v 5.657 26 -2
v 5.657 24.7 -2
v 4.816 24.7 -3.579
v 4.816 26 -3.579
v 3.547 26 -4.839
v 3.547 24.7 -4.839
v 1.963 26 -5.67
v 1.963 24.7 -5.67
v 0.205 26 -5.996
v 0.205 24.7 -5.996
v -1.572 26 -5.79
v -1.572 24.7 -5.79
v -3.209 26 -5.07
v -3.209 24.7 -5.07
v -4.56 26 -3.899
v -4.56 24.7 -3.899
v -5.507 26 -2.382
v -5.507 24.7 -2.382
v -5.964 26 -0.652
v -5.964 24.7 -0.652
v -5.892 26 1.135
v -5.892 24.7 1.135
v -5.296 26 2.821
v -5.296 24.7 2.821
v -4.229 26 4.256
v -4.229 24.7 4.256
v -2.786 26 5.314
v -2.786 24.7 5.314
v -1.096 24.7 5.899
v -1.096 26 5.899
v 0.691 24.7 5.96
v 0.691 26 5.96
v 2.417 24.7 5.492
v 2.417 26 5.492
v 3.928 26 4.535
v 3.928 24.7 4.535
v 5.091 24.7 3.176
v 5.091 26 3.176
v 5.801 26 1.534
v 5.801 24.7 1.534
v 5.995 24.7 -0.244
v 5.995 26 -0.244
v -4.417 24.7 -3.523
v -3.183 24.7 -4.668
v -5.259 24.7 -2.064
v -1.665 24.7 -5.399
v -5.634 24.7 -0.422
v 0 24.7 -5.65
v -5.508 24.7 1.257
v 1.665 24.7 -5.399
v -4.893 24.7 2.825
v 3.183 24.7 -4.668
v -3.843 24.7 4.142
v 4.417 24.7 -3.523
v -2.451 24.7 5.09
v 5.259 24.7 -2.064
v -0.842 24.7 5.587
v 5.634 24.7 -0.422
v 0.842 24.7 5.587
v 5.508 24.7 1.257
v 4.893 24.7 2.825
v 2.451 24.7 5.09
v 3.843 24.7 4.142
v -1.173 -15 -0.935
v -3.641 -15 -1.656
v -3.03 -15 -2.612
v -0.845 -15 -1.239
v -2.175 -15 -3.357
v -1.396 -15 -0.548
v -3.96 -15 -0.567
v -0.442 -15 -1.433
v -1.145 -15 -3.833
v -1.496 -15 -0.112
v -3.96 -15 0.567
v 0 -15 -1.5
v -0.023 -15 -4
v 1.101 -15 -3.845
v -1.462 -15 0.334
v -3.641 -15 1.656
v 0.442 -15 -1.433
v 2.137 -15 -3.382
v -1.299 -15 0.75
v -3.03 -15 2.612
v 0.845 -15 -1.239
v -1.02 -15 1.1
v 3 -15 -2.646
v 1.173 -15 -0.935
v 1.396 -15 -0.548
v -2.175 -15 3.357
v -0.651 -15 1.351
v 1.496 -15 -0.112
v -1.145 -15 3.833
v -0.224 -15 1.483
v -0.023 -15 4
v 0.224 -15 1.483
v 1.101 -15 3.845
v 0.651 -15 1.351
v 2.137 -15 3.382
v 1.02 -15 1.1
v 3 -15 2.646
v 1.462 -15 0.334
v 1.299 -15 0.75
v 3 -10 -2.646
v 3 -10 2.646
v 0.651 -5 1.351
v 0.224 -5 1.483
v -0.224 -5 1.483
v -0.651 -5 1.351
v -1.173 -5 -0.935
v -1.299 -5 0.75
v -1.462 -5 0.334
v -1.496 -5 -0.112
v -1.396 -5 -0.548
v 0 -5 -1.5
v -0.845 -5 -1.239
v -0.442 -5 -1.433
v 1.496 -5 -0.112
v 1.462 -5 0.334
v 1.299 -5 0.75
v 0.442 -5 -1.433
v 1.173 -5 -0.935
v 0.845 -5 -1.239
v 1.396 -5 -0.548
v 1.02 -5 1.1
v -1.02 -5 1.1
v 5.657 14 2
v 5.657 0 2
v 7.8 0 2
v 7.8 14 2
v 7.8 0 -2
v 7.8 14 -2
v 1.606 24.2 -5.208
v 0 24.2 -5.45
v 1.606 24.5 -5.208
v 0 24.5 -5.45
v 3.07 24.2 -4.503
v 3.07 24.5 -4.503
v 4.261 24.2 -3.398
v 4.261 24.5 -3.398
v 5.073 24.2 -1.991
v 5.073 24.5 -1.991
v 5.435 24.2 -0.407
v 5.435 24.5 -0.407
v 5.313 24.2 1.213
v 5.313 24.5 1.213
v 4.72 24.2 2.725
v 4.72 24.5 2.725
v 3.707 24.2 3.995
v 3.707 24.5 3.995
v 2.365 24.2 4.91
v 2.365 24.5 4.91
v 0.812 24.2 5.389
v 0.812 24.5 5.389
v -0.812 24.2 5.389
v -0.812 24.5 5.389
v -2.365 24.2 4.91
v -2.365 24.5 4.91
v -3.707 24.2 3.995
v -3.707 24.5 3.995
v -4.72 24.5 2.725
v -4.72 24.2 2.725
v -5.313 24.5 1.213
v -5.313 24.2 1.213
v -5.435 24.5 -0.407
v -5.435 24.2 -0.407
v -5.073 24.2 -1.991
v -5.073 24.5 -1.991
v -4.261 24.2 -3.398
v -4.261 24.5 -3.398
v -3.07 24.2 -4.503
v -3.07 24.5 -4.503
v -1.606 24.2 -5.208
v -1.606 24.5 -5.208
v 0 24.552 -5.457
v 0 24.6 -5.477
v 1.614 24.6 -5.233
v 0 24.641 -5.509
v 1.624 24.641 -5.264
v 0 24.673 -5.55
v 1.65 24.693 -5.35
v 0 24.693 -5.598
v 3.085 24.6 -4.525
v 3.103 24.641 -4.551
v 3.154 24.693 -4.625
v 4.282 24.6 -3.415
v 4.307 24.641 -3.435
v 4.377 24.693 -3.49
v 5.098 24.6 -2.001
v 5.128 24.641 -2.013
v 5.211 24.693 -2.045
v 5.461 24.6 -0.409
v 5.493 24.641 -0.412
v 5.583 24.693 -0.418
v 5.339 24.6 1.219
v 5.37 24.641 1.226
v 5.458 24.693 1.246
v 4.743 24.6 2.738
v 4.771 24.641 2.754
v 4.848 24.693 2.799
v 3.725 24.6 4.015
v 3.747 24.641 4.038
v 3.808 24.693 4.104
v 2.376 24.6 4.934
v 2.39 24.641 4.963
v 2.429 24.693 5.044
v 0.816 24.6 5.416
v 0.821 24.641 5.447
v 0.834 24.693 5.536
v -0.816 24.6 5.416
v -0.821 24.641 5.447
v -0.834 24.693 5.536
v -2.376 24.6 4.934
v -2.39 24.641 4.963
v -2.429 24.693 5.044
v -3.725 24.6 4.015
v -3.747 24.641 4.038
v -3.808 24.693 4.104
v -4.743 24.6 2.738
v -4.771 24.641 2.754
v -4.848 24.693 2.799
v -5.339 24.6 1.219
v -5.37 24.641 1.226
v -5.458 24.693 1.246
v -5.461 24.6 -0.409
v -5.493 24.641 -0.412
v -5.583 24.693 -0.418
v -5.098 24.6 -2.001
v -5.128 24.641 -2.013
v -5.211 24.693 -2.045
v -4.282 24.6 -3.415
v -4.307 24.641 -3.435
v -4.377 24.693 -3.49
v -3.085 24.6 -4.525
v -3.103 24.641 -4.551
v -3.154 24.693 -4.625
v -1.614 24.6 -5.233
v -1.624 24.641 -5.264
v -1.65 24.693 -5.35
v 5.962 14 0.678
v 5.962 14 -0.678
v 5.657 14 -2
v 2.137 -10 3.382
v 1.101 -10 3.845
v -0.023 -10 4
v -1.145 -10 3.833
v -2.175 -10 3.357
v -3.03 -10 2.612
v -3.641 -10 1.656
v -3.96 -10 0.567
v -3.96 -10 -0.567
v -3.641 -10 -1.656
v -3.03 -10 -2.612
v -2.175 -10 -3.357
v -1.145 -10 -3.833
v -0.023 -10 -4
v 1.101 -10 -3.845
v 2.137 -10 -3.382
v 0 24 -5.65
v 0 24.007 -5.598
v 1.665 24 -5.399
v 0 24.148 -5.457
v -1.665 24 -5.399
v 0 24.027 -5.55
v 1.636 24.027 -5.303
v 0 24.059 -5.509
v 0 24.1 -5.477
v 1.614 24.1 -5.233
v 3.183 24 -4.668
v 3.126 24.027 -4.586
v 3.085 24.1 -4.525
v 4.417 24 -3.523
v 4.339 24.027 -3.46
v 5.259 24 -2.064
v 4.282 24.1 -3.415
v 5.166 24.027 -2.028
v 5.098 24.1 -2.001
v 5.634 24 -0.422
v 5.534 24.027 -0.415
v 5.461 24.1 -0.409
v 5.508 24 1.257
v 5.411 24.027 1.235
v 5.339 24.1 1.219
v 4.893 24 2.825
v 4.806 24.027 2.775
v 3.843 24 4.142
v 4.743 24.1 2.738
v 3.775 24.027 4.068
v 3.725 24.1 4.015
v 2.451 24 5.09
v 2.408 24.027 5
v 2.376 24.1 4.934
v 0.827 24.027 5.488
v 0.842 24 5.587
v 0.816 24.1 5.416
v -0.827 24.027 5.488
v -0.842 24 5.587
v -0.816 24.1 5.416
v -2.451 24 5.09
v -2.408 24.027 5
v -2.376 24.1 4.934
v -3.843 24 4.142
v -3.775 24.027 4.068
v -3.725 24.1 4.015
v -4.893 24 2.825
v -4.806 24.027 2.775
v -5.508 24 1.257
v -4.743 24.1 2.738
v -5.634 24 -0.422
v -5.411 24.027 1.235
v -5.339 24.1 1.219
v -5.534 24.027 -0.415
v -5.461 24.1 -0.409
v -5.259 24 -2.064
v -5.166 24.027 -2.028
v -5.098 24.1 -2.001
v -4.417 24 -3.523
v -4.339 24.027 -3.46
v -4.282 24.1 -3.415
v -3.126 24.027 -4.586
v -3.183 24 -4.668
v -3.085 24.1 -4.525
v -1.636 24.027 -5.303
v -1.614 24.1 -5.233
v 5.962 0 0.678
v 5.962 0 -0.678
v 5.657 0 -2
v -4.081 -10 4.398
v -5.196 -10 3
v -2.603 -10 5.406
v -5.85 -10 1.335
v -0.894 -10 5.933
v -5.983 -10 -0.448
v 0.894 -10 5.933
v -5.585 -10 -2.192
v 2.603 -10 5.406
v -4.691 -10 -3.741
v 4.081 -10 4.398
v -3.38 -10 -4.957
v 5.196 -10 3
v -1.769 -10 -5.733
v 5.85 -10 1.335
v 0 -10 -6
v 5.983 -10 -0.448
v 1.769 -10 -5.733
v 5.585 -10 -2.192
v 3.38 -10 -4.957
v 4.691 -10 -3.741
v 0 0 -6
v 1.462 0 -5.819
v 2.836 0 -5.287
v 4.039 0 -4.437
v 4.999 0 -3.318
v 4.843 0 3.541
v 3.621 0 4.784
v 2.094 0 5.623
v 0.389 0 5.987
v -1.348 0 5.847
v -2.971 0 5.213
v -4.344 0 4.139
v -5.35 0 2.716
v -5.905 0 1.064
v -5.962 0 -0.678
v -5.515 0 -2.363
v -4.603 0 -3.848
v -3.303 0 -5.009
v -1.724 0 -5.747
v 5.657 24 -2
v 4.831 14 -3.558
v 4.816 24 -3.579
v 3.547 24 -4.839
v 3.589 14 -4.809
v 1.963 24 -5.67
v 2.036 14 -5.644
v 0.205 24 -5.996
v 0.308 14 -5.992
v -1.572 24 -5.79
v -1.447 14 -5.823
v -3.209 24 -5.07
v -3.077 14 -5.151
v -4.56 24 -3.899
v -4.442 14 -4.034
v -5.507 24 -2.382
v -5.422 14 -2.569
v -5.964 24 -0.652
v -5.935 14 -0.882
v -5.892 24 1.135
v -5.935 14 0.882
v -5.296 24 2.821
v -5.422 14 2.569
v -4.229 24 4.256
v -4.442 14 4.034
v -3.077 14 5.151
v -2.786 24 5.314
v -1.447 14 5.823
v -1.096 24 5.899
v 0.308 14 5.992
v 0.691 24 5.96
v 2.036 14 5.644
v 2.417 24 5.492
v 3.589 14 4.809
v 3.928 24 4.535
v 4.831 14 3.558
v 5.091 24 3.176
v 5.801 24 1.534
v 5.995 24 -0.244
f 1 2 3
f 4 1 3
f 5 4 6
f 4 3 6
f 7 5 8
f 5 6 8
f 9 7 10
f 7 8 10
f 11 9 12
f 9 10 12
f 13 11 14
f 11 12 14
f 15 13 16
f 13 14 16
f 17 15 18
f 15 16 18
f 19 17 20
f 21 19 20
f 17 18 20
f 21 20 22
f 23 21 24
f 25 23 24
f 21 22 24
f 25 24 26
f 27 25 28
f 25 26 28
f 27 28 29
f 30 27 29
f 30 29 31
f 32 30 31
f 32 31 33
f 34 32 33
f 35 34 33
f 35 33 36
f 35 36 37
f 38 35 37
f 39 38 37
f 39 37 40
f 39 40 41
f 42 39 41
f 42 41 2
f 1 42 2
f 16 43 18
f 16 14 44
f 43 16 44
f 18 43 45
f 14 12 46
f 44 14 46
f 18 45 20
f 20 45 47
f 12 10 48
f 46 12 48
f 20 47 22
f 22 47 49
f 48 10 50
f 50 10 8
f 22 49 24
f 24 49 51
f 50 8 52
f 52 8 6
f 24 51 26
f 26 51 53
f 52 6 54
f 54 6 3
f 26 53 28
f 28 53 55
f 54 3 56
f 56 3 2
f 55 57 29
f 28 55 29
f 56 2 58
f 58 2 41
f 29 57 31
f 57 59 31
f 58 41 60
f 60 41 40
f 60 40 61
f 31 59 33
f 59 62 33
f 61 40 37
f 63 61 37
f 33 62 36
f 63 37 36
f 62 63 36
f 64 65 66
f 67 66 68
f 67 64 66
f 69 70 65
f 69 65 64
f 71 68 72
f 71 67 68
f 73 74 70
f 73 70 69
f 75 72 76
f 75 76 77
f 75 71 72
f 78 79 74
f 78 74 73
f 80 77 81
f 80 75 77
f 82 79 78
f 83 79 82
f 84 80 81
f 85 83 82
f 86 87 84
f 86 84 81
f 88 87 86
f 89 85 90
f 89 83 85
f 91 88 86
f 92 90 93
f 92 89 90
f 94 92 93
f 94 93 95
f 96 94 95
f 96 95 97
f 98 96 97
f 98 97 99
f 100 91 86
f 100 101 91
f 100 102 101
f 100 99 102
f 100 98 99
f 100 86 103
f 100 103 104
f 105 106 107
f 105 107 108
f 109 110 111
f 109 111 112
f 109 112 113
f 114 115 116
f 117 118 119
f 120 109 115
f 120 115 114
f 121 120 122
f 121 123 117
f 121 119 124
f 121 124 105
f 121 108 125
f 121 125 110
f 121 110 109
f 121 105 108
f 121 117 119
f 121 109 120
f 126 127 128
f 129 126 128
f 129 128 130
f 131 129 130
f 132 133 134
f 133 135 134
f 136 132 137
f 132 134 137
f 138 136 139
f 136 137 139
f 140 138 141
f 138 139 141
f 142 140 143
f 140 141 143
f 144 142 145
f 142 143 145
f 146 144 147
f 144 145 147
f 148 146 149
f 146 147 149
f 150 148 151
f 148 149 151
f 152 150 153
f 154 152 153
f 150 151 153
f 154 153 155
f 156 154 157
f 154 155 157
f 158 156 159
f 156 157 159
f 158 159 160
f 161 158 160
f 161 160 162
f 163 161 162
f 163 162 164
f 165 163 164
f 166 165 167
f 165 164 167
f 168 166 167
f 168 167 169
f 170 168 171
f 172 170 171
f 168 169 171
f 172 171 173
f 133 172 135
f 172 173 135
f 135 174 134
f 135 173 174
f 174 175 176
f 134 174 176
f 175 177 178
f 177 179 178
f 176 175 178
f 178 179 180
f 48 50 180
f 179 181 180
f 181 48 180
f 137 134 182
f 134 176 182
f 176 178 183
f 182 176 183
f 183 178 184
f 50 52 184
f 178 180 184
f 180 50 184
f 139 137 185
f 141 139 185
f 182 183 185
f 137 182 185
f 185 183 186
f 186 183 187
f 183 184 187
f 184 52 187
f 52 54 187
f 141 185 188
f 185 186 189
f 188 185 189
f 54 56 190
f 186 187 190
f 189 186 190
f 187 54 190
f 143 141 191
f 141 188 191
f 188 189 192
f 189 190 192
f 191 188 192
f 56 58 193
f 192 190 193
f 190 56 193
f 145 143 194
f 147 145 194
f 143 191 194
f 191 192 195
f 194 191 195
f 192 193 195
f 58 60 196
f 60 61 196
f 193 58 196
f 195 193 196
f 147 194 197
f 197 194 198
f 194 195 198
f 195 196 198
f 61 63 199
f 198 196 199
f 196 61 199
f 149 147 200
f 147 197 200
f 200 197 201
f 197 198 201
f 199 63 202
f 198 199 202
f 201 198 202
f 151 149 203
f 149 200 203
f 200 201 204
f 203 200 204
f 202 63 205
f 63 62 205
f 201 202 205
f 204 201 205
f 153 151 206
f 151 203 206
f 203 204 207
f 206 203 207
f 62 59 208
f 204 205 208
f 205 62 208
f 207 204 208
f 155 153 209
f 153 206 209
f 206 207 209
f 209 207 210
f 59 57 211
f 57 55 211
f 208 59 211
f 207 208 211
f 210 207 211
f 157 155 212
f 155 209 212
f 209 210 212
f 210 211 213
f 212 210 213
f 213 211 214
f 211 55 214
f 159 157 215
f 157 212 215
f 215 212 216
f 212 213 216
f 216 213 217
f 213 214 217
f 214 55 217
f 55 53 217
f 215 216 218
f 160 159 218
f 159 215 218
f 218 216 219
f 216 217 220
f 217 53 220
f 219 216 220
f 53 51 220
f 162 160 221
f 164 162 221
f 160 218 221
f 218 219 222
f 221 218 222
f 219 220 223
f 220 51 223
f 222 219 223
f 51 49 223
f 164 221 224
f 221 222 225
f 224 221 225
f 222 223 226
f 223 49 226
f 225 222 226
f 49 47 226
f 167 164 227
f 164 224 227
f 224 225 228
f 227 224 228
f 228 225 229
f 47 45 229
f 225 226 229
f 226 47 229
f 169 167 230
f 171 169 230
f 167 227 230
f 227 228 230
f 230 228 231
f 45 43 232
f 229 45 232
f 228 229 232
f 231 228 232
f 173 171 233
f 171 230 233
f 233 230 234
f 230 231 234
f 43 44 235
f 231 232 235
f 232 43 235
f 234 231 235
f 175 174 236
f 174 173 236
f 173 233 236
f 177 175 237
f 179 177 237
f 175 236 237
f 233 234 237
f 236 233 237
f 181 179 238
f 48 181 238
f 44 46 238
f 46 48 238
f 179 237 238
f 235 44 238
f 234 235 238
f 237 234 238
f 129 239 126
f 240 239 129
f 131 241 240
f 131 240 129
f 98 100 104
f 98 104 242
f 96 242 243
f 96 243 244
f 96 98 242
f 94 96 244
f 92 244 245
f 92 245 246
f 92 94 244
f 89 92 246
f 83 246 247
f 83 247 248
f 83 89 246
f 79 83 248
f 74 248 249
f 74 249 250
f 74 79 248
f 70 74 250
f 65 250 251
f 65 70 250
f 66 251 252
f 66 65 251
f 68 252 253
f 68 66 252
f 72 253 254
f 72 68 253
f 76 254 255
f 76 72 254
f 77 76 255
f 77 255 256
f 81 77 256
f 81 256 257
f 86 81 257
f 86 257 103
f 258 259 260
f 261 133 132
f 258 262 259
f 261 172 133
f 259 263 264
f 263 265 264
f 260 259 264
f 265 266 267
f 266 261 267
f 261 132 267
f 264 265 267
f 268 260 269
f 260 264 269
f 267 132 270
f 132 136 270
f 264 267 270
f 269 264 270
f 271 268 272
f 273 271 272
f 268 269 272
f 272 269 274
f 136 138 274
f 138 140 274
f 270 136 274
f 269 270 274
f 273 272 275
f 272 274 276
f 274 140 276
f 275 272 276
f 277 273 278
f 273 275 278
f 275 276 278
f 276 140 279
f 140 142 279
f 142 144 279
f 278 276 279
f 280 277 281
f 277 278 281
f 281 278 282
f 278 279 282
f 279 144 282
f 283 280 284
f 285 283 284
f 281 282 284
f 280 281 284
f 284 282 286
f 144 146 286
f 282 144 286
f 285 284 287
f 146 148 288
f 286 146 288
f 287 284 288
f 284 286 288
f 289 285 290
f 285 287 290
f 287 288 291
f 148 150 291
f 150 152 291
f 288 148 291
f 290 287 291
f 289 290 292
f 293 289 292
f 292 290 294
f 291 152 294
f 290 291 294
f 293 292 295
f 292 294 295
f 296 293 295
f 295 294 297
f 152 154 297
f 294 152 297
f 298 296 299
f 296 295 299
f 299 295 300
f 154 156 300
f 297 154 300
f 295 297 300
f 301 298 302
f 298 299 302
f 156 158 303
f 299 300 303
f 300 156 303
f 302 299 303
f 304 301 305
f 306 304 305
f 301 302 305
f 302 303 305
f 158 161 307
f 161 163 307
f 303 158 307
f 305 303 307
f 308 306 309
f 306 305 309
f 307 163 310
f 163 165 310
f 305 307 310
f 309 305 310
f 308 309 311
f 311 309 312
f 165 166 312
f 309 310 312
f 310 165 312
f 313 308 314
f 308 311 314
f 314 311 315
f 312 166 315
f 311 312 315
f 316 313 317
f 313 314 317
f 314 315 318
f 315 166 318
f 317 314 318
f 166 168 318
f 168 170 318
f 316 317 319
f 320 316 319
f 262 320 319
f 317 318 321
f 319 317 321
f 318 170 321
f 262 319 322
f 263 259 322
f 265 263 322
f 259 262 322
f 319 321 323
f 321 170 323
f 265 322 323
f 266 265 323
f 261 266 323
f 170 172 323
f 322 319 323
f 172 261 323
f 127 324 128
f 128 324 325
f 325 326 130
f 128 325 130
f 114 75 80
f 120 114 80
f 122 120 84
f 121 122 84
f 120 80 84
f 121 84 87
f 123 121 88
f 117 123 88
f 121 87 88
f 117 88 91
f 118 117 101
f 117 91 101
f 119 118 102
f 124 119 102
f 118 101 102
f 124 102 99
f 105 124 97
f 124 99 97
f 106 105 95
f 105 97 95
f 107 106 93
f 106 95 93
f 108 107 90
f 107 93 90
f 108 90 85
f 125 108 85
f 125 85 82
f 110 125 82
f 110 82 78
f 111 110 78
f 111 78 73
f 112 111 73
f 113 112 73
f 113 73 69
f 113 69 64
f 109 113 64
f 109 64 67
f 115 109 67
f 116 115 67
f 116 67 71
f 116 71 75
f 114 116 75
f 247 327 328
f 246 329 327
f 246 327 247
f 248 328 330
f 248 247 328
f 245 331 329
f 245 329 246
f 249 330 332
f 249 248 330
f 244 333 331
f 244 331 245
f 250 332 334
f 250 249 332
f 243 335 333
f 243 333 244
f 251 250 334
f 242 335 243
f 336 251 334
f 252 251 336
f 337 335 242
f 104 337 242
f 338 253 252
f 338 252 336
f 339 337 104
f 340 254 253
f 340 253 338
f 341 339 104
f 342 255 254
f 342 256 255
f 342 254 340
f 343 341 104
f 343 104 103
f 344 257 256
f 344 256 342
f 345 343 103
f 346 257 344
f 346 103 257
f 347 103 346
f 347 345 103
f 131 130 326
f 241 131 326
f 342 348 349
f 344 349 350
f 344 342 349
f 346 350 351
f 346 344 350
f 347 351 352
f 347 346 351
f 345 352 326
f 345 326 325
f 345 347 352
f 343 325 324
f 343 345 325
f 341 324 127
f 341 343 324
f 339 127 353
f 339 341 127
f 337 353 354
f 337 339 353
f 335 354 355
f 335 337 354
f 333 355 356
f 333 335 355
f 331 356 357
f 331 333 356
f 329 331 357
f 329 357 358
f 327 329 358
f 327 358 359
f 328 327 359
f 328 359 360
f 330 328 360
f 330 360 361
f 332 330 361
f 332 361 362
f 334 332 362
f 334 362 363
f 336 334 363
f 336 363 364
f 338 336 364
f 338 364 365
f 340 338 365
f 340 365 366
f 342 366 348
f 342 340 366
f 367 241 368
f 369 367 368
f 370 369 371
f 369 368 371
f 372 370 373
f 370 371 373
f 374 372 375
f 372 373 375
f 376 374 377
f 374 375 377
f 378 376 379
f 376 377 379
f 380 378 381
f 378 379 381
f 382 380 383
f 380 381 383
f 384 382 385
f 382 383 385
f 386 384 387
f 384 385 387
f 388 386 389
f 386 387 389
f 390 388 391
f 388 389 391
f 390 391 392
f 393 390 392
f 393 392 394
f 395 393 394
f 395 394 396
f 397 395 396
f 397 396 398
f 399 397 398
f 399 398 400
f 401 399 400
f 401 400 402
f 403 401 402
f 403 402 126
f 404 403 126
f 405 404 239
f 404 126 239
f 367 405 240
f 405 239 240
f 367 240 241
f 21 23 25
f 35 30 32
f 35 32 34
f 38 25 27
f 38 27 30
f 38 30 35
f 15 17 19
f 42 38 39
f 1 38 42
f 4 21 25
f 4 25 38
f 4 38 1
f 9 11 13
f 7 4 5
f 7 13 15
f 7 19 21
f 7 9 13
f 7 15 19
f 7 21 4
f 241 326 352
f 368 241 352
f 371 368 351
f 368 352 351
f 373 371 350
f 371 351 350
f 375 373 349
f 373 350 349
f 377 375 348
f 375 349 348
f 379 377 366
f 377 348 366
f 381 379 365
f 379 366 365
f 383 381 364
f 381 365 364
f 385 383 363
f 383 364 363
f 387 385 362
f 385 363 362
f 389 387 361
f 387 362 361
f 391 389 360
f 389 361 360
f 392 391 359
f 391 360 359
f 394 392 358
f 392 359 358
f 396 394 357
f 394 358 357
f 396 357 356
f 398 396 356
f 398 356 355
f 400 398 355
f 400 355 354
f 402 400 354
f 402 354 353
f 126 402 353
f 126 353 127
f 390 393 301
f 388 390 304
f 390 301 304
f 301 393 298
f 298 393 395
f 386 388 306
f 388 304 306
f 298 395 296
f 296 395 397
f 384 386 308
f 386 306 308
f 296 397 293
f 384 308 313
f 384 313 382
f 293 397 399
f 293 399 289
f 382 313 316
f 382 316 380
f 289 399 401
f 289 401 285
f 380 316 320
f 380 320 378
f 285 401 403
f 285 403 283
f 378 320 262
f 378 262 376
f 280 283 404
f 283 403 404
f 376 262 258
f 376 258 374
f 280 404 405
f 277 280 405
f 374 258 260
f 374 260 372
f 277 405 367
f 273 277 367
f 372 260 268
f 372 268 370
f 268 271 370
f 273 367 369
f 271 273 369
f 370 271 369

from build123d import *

# Parameters (mm, degrees)
BOSS_EXTRUDE1_DEPTH = 14
SKETCH2_R           = 6
BOSS_EXTRUDE2_DEPTH = 12
BOSS_EXTRUDE3_START = 10
SKETCH3_R           = 6
BOSS_EXTRUDE3_DEPTH = 10
SKETCH4_R           = 1.5
CUT_EXTRUDE1_DEPTH  = 5
BOSS_EXTRUDE4_START = 5
SKETCH5_R           = 1.5
BOSS_EXTRUDE4_DEPTH = 5


with BuildPart() as part:
    # Sketch1 → Boss-Extrude1 (new body)
    with BuildSketch(Plane(origin=(0, 0, 0), x_dir=(1, 0, 0), z_dir=(0, 1, 0))):
        with BuildLine():
            Line((7.8, -2), (7.8, 2))
            Line((7.8, 2), (5.656854249, 2))
            ThreePointArc((5.656854249, 2), (-6, 0), (5.656854249, -2))
            Line((5.656854249, -2), (7.8, -2))
        make_face()
    extrude(amount=BOSS_EXTRUDE1_DEPTH)

    # Sketch2 → Boss-Extrude2 (add)
    with BuildSketch(Plane(origin=(0, 14, 0), x_dir=(1, 0, 0), z_dir=(0, 1, 0))):
        with Locations(Location((0, 0, 0), (0, 0, 19.471220634))):
            Circle(SKETCH2_R)
    extrude(amount=BOSS_EXTRUDE2_DEPTH)

    # Sketch3 → Boss-Extrude3 (add)
    with BuildSketch(Plane.XZ.offset(BOSS_EXTRUDE3_START)):
        with Locations(Location((0, 0, 0), (0, 0, 270))):
            Circle(SKETCH3_R)
    extrude(amount=-BOSS_EXTRUDE3_DEPTH)

    # Sketch4 → Cut-Extrude1 (cut)
    with BuildSketch(Plane.XZ.offset(10)):
        with Locations(Location((0, 0, 0), (0, 0, 270))):
            Circle(SKETCH4_R)
    extrude(amount=-CUT_EXTRUDE1_DEPTH, mode=Mode.SUBTRACT)

    # Groove Sketch → Retaining Ring Groove (revolve, cut)
    with BuildSketch(Plane(origin=(1.604252923, 12.182890291, 0.373259529), x_dir=(-0.9343262431877186, 0.2824476966643587, -0.2173885230174828), z_dir=(-0.2266157025474993, 0, 0.9739842521103221)), mode=Mode.PRIVATE) as retaining_ring_groove_sk:
        with BuildLine():
            Line((10.535414006, -9.946396708), (11.998320123, -9.51566397))
            Line((11.998320123, -9.51566397), (11.800606735, -8.84416608))
            Line((11.800606735, -8.84416608), (10.337700618, -9.274898818))
            ThreePointArc((10.337700618, -9.274898818), (10.21858296, -9.371036434), (10.202333617, -9.523244897))
            Line((10.202333617, -9.523244897), (10.287067926, -9.811029707))
            ThreePointArc((10.287067926, -9.811029707), (10.383205542, -9.930147365), (10.535414006, -9.946396708))
        make_face()
    revolve(retaining_ring_groove_sk.sketch.rotate(Axis((0, 60.224615576, 0), (0, -1, 0)), 76.902094509), axis=Axis((0, 60.224615576, 0), (0, -1, 0)), mode=Mode.SUBTRACT)

    # Sketch5 → Boss-Extrude4 (add)
    with BuildSketch(Plane.XZ.offset(10).offset(BOSS_EXTRUDE4_START)):
        with BuildLine():
            Line((3, -2.645751311), (3, 2.645751311))
            ThreePointArc((3, 2.645751311), (-4, 0), (3, -2.645751311))
        make_face()
        with Locations(Location((0, 0, 0), (0, 0, 270))):
            Circle(SKETCH5_R, mode=Mode.SUBTRACT)
    extrude(amount=-BOSS_EXTRUDE4_DEPTH)


solid = part.part
